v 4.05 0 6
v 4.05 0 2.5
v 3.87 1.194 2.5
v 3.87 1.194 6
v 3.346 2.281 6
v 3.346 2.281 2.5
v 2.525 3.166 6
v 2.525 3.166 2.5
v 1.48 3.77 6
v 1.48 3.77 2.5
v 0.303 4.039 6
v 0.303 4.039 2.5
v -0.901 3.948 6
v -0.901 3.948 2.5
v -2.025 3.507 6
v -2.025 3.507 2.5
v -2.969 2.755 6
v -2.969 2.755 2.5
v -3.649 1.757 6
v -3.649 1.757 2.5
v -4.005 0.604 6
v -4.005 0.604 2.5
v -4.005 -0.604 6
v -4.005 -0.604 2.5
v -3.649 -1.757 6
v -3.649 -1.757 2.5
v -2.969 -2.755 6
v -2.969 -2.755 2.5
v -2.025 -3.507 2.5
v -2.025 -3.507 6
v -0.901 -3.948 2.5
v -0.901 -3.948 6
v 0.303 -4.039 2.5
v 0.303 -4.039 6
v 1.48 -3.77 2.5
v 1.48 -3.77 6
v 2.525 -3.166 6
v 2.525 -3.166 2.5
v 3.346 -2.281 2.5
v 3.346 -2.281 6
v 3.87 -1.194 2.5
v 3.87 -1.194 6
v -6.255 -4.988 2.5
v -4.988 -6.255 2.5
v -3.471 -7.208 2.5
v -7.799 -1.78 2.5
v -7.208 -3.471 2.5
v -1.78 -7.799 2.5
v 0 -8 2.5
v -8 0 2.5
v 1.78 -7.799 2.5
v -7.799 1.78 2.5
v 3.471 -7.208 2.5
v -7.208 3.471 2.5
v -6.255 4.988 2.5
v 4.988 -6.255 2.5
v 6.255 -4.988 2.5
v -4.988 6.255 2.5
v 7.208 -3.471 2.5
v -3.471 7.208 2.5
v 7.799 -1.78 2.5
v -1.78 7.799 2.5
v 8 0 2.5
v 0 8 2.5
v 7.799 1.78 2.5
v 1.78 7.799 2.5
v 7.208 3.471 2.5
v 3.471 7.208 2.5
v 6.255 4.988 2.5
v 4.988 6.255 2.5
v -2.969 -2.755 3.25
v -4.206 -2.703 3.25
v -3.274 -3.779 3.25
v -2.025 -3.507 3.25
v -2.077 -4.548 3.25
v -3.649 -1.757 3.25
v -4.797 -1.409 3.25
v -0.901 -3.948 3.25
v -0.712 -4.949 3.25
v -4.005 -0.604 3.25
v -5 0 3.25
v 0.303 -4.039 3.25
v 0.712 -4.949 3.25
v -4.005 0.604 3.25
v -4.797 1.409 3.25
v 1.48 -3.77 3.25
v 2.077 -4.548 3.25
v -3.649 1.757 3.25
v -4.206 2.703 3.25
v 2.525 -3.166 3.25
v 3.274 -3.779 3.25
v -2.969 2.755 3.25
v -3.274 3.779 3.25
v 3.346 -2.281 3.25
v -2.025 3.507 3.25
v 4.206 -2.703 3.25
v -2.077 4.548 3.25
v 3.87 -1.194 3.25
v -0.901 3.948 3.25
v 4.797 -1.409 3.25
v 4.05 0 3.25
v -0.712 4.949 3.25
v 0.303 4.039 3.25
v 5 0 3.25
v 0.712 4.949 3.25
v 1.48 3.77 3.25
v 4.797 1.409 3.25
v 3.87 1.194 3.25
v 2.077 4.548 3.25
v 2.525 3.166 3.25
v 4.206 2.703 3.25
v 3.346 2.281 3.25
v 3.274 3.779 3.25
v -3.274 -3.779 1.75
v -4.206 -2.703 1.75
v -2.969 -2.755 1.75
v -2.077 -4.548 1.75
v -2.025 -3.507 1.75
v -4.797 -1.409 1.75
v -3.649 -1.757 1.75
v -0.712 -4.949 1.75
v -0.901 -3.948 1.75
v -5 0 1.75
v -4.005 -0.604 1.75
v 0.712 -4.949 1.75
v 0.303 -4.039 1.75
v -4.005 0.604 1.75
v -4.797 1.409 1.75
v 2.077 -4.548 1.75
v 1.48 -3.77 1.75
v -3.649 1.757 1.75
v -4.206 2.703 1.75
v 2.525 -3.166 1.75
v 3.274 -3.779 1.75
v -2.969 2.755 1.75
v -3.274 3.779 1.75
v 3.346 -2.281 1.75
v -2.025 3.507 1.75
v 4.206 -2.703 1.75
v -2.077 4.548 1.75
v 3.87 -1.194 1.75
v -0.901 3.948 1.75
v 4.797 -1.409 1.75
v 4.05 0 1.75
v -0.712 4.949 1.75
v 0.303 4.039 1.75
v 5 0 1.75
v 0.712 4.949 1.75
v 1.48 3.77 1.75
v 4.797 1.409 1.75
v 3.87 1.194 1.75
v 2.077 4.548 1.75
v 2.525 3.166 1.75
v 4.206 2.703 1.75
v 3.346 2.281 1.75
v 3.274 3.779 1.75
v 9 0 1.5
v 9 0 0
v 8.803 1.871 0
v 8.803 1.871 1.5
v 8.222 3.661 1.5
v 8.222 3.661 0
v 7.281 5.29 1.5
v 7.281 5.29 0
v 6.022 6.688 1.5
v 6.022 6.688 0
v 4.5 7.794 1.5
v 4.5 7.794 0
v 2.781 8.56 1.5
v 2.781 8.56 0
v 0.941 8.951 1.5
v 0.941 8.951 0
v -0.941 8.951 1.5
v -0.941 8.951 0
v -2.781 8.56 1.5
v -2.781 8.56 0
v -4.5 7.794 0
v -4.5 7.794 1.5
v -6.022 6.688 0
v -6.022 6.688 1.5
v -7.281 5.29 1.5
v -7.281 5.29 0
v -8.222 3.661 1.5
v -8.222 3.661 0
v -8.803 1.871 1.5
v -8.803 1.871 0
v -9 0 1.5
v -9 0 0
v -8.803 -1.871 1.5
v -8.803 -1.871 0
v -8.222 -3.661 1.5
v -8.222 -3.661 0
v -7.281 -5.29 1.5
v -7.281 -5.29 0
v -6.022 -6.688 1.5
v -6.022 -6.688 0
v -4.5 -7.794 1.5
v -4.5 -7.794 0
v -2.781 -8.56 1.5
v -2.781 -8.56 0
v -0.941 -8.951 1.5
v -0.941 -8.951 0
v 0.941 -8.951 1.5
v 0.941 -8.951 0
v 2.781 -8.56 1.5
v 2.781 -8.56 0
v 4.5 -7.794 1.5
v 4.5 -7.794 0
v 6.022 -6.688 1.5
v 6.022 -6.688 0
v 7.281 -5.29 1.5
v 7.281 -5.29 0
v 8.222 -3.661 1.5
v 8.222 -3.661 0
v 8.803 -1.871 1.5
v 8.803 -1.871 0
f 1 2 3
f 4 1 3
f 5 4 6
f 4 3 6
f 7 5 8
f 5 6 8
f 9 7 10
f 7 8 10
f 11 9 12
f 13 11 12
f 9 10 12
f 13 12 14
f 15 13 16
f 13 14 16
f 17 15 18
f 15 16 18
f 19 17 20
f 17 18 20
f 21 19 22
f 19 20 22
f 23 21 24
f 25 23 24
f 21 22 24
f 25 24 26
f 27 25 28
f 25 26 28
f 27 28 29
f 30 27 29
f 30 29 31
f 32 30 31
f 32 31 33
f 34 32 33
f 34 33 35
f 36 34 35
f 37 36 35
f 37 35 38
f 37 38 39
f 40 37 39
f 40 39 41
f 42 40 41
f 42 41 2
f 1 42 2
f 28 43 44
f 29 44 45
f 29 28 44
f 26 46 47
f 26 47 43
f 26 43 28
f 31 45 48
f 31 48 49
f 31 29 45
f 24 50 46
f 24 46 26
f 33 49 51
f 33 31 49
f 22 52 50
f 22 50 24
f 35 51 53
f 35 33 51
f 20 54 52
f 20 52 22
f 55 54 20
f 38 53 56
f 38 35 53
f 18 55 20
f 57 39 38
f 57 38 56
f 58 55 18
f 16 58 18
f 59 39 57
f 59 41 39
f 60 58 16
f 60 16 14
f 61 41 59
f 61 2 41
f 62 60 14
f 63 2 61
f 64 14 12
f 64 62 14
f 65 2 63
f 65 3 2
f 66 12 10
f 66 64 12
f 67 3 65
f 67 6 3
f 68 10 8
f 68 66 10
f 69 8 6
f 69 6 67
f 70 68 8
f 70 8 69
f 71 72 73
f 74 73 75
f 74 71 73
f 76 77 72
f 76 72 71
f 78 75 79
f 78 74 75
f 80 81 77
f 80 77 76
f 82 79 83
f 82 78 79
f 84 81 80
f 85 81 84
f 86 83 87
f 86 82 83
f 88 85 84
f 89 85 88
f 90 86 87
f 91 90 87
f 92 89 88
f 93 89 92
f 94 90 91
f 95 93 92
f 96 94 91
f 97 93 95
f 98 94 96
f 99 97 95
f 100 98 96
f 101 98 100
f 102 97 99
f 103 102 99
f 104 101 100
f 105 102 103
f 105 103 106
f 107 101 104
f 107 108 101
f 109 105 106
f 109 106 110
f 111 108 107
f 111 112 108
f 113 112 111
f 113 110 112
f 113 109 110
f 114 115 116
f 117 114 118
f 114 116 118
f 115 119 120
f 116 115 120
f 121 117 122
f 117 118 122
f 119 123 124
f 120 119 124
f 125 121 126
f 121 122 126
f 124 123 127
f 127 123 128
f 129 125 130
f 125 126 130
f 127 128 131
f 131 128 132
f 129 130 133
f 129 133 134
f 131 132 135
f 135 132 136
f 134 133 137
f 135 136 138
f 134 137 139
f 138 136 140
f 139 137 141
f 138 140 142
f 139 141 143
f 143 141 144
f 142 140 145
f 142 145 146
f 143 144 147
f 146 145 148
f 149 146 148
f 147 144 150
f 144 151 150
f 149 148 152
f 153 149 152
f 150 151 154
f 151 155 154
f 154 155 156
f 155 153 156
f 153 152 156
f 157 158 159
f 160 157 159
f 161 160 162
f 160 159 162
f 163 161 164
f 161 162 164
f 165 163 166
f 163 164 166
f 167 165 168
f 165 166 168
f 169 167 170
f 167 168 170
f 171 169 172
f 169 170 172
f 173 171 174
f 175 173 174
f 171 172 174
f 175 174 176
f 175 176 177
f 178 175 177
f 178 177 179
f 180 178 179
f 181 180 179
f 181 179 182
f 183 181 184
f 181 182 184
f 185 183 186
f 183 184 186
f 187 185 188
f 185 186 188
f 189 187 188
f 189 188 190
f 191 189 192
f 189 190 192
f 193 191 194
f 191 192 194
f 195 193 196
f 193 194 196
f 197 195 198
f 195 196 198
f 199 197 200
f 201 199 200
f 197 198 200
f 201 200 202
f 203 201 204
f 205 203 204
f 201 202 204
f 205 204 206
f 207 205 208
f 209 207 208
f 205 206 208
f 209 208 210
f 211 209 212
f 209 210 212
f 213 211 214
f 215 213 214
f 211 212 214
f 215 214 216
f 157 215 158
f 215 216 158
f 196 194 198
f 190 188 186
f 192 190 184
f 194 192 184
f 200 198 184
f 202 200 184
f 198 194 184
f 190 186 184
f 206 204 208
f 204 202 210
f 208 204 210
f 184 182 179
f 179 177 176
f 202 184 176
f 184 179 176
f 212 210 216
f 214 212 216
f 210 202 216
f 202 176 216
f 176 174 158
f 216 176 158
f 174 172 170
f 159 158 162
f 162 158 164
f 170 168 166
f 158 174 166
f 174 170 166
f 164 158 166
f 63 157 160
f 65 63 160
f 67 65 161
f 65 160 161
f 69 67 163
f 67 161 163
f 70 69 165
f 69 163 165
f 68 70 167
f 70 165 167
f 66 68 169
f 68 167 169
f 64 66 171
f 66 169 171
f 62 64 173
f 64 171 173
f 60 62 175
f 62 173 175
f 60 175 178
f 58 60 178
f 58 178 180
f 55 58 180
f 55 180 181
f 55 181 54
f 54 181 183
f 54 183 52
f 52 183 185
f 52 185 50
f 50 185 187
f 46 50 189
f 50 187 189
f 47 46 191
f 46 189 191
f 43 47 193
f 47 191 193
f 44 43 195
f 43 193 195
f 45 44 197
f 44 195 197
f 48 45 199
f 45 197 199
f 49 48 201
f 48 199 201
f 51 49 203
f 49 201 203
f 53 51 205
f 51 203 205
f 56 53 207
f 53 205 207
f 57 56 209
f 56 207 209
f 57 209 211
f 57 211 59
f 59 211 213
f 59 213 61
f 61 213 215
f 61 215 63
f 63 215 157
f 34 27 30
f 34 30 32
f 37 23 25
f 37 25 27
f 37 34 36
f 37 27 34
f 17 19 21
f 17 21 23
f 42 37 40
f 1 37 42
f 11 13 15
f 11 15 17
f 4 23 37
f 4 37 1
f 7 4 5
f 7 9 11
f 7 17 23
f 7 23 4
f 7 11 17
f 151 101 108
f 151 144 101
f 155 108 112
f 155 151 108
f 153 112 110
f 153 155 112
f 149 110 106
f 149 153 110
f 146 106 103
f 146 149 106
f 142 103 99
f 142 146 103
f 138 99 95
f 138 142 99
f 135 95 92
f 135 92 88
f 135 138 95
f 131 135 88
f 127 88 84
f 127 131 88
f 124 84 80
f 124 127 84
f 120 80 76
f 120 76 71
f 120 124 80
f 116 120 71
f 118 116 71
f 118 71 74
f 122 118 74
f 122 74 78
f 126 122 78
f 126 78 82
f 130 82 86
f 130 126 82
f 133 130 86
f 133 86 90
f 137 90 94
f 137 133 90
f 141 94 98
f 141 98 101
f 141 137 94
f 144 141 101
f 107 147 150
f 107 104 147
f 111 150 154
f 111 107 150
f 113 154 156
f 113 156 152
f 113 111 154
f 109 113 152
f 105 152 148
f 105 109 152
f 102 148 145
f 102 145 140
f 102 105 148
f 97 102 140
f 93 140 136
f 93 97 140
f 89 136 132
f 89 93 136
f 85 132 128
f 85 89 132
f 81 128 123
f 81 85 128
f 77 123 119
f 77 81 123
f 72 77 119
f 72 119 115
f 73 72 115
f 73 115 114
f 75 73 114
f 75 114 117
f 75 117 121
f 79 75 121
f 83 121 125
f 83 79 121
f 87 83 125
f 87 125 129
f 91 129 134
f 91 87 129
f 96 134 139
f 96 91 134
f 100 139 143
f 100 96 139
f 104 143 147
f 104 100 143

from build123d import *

# Parameters (mm, degrees)
F0_R     = 9
F0_R_2   = 4.05
F1_DEPTH = 2.5
F2_DEPTH = 6
F3_R     = 5
F3_R_2   = 4.05
F4_DEPTH = 0.75
F5_SIZE  = 1


with BuildPart() as f1:
    # F0 (on Top) → F1 (new body)
    with BuildSketch(Plane.XY):
        Circle(F0_R)
        Circle(F0_R_2, mode=Mode.SUBTRACT)
    extrude(amount=F1_DEPTH)

    # F0 (on Top) → F2 (join)
    with BuildSketch(Plane.XY):
        Circle(F0_R_2)
    extrude(amount=F2_DEPTH)

    # F5
    f5_edges = [f1.edges().sort_by_distance(p)[0] for p in [
        (-9, 0, 2.5),
    ]]
    chamfer(f5_edges, length=F5_SIZE)


with BuildPart() as f4:
    # F3 (on face) → F4 (new body, symmetric)
    with BuildSketch(Plane.XY.offset(2.5)):
        Circle(F3_R)
        Circle(F3_R_2, mode=Mode.SUBTRACT)
    extrude(amount=F4_DEPTH, both=True)


solid = Compound([f1.part, f4.part])
